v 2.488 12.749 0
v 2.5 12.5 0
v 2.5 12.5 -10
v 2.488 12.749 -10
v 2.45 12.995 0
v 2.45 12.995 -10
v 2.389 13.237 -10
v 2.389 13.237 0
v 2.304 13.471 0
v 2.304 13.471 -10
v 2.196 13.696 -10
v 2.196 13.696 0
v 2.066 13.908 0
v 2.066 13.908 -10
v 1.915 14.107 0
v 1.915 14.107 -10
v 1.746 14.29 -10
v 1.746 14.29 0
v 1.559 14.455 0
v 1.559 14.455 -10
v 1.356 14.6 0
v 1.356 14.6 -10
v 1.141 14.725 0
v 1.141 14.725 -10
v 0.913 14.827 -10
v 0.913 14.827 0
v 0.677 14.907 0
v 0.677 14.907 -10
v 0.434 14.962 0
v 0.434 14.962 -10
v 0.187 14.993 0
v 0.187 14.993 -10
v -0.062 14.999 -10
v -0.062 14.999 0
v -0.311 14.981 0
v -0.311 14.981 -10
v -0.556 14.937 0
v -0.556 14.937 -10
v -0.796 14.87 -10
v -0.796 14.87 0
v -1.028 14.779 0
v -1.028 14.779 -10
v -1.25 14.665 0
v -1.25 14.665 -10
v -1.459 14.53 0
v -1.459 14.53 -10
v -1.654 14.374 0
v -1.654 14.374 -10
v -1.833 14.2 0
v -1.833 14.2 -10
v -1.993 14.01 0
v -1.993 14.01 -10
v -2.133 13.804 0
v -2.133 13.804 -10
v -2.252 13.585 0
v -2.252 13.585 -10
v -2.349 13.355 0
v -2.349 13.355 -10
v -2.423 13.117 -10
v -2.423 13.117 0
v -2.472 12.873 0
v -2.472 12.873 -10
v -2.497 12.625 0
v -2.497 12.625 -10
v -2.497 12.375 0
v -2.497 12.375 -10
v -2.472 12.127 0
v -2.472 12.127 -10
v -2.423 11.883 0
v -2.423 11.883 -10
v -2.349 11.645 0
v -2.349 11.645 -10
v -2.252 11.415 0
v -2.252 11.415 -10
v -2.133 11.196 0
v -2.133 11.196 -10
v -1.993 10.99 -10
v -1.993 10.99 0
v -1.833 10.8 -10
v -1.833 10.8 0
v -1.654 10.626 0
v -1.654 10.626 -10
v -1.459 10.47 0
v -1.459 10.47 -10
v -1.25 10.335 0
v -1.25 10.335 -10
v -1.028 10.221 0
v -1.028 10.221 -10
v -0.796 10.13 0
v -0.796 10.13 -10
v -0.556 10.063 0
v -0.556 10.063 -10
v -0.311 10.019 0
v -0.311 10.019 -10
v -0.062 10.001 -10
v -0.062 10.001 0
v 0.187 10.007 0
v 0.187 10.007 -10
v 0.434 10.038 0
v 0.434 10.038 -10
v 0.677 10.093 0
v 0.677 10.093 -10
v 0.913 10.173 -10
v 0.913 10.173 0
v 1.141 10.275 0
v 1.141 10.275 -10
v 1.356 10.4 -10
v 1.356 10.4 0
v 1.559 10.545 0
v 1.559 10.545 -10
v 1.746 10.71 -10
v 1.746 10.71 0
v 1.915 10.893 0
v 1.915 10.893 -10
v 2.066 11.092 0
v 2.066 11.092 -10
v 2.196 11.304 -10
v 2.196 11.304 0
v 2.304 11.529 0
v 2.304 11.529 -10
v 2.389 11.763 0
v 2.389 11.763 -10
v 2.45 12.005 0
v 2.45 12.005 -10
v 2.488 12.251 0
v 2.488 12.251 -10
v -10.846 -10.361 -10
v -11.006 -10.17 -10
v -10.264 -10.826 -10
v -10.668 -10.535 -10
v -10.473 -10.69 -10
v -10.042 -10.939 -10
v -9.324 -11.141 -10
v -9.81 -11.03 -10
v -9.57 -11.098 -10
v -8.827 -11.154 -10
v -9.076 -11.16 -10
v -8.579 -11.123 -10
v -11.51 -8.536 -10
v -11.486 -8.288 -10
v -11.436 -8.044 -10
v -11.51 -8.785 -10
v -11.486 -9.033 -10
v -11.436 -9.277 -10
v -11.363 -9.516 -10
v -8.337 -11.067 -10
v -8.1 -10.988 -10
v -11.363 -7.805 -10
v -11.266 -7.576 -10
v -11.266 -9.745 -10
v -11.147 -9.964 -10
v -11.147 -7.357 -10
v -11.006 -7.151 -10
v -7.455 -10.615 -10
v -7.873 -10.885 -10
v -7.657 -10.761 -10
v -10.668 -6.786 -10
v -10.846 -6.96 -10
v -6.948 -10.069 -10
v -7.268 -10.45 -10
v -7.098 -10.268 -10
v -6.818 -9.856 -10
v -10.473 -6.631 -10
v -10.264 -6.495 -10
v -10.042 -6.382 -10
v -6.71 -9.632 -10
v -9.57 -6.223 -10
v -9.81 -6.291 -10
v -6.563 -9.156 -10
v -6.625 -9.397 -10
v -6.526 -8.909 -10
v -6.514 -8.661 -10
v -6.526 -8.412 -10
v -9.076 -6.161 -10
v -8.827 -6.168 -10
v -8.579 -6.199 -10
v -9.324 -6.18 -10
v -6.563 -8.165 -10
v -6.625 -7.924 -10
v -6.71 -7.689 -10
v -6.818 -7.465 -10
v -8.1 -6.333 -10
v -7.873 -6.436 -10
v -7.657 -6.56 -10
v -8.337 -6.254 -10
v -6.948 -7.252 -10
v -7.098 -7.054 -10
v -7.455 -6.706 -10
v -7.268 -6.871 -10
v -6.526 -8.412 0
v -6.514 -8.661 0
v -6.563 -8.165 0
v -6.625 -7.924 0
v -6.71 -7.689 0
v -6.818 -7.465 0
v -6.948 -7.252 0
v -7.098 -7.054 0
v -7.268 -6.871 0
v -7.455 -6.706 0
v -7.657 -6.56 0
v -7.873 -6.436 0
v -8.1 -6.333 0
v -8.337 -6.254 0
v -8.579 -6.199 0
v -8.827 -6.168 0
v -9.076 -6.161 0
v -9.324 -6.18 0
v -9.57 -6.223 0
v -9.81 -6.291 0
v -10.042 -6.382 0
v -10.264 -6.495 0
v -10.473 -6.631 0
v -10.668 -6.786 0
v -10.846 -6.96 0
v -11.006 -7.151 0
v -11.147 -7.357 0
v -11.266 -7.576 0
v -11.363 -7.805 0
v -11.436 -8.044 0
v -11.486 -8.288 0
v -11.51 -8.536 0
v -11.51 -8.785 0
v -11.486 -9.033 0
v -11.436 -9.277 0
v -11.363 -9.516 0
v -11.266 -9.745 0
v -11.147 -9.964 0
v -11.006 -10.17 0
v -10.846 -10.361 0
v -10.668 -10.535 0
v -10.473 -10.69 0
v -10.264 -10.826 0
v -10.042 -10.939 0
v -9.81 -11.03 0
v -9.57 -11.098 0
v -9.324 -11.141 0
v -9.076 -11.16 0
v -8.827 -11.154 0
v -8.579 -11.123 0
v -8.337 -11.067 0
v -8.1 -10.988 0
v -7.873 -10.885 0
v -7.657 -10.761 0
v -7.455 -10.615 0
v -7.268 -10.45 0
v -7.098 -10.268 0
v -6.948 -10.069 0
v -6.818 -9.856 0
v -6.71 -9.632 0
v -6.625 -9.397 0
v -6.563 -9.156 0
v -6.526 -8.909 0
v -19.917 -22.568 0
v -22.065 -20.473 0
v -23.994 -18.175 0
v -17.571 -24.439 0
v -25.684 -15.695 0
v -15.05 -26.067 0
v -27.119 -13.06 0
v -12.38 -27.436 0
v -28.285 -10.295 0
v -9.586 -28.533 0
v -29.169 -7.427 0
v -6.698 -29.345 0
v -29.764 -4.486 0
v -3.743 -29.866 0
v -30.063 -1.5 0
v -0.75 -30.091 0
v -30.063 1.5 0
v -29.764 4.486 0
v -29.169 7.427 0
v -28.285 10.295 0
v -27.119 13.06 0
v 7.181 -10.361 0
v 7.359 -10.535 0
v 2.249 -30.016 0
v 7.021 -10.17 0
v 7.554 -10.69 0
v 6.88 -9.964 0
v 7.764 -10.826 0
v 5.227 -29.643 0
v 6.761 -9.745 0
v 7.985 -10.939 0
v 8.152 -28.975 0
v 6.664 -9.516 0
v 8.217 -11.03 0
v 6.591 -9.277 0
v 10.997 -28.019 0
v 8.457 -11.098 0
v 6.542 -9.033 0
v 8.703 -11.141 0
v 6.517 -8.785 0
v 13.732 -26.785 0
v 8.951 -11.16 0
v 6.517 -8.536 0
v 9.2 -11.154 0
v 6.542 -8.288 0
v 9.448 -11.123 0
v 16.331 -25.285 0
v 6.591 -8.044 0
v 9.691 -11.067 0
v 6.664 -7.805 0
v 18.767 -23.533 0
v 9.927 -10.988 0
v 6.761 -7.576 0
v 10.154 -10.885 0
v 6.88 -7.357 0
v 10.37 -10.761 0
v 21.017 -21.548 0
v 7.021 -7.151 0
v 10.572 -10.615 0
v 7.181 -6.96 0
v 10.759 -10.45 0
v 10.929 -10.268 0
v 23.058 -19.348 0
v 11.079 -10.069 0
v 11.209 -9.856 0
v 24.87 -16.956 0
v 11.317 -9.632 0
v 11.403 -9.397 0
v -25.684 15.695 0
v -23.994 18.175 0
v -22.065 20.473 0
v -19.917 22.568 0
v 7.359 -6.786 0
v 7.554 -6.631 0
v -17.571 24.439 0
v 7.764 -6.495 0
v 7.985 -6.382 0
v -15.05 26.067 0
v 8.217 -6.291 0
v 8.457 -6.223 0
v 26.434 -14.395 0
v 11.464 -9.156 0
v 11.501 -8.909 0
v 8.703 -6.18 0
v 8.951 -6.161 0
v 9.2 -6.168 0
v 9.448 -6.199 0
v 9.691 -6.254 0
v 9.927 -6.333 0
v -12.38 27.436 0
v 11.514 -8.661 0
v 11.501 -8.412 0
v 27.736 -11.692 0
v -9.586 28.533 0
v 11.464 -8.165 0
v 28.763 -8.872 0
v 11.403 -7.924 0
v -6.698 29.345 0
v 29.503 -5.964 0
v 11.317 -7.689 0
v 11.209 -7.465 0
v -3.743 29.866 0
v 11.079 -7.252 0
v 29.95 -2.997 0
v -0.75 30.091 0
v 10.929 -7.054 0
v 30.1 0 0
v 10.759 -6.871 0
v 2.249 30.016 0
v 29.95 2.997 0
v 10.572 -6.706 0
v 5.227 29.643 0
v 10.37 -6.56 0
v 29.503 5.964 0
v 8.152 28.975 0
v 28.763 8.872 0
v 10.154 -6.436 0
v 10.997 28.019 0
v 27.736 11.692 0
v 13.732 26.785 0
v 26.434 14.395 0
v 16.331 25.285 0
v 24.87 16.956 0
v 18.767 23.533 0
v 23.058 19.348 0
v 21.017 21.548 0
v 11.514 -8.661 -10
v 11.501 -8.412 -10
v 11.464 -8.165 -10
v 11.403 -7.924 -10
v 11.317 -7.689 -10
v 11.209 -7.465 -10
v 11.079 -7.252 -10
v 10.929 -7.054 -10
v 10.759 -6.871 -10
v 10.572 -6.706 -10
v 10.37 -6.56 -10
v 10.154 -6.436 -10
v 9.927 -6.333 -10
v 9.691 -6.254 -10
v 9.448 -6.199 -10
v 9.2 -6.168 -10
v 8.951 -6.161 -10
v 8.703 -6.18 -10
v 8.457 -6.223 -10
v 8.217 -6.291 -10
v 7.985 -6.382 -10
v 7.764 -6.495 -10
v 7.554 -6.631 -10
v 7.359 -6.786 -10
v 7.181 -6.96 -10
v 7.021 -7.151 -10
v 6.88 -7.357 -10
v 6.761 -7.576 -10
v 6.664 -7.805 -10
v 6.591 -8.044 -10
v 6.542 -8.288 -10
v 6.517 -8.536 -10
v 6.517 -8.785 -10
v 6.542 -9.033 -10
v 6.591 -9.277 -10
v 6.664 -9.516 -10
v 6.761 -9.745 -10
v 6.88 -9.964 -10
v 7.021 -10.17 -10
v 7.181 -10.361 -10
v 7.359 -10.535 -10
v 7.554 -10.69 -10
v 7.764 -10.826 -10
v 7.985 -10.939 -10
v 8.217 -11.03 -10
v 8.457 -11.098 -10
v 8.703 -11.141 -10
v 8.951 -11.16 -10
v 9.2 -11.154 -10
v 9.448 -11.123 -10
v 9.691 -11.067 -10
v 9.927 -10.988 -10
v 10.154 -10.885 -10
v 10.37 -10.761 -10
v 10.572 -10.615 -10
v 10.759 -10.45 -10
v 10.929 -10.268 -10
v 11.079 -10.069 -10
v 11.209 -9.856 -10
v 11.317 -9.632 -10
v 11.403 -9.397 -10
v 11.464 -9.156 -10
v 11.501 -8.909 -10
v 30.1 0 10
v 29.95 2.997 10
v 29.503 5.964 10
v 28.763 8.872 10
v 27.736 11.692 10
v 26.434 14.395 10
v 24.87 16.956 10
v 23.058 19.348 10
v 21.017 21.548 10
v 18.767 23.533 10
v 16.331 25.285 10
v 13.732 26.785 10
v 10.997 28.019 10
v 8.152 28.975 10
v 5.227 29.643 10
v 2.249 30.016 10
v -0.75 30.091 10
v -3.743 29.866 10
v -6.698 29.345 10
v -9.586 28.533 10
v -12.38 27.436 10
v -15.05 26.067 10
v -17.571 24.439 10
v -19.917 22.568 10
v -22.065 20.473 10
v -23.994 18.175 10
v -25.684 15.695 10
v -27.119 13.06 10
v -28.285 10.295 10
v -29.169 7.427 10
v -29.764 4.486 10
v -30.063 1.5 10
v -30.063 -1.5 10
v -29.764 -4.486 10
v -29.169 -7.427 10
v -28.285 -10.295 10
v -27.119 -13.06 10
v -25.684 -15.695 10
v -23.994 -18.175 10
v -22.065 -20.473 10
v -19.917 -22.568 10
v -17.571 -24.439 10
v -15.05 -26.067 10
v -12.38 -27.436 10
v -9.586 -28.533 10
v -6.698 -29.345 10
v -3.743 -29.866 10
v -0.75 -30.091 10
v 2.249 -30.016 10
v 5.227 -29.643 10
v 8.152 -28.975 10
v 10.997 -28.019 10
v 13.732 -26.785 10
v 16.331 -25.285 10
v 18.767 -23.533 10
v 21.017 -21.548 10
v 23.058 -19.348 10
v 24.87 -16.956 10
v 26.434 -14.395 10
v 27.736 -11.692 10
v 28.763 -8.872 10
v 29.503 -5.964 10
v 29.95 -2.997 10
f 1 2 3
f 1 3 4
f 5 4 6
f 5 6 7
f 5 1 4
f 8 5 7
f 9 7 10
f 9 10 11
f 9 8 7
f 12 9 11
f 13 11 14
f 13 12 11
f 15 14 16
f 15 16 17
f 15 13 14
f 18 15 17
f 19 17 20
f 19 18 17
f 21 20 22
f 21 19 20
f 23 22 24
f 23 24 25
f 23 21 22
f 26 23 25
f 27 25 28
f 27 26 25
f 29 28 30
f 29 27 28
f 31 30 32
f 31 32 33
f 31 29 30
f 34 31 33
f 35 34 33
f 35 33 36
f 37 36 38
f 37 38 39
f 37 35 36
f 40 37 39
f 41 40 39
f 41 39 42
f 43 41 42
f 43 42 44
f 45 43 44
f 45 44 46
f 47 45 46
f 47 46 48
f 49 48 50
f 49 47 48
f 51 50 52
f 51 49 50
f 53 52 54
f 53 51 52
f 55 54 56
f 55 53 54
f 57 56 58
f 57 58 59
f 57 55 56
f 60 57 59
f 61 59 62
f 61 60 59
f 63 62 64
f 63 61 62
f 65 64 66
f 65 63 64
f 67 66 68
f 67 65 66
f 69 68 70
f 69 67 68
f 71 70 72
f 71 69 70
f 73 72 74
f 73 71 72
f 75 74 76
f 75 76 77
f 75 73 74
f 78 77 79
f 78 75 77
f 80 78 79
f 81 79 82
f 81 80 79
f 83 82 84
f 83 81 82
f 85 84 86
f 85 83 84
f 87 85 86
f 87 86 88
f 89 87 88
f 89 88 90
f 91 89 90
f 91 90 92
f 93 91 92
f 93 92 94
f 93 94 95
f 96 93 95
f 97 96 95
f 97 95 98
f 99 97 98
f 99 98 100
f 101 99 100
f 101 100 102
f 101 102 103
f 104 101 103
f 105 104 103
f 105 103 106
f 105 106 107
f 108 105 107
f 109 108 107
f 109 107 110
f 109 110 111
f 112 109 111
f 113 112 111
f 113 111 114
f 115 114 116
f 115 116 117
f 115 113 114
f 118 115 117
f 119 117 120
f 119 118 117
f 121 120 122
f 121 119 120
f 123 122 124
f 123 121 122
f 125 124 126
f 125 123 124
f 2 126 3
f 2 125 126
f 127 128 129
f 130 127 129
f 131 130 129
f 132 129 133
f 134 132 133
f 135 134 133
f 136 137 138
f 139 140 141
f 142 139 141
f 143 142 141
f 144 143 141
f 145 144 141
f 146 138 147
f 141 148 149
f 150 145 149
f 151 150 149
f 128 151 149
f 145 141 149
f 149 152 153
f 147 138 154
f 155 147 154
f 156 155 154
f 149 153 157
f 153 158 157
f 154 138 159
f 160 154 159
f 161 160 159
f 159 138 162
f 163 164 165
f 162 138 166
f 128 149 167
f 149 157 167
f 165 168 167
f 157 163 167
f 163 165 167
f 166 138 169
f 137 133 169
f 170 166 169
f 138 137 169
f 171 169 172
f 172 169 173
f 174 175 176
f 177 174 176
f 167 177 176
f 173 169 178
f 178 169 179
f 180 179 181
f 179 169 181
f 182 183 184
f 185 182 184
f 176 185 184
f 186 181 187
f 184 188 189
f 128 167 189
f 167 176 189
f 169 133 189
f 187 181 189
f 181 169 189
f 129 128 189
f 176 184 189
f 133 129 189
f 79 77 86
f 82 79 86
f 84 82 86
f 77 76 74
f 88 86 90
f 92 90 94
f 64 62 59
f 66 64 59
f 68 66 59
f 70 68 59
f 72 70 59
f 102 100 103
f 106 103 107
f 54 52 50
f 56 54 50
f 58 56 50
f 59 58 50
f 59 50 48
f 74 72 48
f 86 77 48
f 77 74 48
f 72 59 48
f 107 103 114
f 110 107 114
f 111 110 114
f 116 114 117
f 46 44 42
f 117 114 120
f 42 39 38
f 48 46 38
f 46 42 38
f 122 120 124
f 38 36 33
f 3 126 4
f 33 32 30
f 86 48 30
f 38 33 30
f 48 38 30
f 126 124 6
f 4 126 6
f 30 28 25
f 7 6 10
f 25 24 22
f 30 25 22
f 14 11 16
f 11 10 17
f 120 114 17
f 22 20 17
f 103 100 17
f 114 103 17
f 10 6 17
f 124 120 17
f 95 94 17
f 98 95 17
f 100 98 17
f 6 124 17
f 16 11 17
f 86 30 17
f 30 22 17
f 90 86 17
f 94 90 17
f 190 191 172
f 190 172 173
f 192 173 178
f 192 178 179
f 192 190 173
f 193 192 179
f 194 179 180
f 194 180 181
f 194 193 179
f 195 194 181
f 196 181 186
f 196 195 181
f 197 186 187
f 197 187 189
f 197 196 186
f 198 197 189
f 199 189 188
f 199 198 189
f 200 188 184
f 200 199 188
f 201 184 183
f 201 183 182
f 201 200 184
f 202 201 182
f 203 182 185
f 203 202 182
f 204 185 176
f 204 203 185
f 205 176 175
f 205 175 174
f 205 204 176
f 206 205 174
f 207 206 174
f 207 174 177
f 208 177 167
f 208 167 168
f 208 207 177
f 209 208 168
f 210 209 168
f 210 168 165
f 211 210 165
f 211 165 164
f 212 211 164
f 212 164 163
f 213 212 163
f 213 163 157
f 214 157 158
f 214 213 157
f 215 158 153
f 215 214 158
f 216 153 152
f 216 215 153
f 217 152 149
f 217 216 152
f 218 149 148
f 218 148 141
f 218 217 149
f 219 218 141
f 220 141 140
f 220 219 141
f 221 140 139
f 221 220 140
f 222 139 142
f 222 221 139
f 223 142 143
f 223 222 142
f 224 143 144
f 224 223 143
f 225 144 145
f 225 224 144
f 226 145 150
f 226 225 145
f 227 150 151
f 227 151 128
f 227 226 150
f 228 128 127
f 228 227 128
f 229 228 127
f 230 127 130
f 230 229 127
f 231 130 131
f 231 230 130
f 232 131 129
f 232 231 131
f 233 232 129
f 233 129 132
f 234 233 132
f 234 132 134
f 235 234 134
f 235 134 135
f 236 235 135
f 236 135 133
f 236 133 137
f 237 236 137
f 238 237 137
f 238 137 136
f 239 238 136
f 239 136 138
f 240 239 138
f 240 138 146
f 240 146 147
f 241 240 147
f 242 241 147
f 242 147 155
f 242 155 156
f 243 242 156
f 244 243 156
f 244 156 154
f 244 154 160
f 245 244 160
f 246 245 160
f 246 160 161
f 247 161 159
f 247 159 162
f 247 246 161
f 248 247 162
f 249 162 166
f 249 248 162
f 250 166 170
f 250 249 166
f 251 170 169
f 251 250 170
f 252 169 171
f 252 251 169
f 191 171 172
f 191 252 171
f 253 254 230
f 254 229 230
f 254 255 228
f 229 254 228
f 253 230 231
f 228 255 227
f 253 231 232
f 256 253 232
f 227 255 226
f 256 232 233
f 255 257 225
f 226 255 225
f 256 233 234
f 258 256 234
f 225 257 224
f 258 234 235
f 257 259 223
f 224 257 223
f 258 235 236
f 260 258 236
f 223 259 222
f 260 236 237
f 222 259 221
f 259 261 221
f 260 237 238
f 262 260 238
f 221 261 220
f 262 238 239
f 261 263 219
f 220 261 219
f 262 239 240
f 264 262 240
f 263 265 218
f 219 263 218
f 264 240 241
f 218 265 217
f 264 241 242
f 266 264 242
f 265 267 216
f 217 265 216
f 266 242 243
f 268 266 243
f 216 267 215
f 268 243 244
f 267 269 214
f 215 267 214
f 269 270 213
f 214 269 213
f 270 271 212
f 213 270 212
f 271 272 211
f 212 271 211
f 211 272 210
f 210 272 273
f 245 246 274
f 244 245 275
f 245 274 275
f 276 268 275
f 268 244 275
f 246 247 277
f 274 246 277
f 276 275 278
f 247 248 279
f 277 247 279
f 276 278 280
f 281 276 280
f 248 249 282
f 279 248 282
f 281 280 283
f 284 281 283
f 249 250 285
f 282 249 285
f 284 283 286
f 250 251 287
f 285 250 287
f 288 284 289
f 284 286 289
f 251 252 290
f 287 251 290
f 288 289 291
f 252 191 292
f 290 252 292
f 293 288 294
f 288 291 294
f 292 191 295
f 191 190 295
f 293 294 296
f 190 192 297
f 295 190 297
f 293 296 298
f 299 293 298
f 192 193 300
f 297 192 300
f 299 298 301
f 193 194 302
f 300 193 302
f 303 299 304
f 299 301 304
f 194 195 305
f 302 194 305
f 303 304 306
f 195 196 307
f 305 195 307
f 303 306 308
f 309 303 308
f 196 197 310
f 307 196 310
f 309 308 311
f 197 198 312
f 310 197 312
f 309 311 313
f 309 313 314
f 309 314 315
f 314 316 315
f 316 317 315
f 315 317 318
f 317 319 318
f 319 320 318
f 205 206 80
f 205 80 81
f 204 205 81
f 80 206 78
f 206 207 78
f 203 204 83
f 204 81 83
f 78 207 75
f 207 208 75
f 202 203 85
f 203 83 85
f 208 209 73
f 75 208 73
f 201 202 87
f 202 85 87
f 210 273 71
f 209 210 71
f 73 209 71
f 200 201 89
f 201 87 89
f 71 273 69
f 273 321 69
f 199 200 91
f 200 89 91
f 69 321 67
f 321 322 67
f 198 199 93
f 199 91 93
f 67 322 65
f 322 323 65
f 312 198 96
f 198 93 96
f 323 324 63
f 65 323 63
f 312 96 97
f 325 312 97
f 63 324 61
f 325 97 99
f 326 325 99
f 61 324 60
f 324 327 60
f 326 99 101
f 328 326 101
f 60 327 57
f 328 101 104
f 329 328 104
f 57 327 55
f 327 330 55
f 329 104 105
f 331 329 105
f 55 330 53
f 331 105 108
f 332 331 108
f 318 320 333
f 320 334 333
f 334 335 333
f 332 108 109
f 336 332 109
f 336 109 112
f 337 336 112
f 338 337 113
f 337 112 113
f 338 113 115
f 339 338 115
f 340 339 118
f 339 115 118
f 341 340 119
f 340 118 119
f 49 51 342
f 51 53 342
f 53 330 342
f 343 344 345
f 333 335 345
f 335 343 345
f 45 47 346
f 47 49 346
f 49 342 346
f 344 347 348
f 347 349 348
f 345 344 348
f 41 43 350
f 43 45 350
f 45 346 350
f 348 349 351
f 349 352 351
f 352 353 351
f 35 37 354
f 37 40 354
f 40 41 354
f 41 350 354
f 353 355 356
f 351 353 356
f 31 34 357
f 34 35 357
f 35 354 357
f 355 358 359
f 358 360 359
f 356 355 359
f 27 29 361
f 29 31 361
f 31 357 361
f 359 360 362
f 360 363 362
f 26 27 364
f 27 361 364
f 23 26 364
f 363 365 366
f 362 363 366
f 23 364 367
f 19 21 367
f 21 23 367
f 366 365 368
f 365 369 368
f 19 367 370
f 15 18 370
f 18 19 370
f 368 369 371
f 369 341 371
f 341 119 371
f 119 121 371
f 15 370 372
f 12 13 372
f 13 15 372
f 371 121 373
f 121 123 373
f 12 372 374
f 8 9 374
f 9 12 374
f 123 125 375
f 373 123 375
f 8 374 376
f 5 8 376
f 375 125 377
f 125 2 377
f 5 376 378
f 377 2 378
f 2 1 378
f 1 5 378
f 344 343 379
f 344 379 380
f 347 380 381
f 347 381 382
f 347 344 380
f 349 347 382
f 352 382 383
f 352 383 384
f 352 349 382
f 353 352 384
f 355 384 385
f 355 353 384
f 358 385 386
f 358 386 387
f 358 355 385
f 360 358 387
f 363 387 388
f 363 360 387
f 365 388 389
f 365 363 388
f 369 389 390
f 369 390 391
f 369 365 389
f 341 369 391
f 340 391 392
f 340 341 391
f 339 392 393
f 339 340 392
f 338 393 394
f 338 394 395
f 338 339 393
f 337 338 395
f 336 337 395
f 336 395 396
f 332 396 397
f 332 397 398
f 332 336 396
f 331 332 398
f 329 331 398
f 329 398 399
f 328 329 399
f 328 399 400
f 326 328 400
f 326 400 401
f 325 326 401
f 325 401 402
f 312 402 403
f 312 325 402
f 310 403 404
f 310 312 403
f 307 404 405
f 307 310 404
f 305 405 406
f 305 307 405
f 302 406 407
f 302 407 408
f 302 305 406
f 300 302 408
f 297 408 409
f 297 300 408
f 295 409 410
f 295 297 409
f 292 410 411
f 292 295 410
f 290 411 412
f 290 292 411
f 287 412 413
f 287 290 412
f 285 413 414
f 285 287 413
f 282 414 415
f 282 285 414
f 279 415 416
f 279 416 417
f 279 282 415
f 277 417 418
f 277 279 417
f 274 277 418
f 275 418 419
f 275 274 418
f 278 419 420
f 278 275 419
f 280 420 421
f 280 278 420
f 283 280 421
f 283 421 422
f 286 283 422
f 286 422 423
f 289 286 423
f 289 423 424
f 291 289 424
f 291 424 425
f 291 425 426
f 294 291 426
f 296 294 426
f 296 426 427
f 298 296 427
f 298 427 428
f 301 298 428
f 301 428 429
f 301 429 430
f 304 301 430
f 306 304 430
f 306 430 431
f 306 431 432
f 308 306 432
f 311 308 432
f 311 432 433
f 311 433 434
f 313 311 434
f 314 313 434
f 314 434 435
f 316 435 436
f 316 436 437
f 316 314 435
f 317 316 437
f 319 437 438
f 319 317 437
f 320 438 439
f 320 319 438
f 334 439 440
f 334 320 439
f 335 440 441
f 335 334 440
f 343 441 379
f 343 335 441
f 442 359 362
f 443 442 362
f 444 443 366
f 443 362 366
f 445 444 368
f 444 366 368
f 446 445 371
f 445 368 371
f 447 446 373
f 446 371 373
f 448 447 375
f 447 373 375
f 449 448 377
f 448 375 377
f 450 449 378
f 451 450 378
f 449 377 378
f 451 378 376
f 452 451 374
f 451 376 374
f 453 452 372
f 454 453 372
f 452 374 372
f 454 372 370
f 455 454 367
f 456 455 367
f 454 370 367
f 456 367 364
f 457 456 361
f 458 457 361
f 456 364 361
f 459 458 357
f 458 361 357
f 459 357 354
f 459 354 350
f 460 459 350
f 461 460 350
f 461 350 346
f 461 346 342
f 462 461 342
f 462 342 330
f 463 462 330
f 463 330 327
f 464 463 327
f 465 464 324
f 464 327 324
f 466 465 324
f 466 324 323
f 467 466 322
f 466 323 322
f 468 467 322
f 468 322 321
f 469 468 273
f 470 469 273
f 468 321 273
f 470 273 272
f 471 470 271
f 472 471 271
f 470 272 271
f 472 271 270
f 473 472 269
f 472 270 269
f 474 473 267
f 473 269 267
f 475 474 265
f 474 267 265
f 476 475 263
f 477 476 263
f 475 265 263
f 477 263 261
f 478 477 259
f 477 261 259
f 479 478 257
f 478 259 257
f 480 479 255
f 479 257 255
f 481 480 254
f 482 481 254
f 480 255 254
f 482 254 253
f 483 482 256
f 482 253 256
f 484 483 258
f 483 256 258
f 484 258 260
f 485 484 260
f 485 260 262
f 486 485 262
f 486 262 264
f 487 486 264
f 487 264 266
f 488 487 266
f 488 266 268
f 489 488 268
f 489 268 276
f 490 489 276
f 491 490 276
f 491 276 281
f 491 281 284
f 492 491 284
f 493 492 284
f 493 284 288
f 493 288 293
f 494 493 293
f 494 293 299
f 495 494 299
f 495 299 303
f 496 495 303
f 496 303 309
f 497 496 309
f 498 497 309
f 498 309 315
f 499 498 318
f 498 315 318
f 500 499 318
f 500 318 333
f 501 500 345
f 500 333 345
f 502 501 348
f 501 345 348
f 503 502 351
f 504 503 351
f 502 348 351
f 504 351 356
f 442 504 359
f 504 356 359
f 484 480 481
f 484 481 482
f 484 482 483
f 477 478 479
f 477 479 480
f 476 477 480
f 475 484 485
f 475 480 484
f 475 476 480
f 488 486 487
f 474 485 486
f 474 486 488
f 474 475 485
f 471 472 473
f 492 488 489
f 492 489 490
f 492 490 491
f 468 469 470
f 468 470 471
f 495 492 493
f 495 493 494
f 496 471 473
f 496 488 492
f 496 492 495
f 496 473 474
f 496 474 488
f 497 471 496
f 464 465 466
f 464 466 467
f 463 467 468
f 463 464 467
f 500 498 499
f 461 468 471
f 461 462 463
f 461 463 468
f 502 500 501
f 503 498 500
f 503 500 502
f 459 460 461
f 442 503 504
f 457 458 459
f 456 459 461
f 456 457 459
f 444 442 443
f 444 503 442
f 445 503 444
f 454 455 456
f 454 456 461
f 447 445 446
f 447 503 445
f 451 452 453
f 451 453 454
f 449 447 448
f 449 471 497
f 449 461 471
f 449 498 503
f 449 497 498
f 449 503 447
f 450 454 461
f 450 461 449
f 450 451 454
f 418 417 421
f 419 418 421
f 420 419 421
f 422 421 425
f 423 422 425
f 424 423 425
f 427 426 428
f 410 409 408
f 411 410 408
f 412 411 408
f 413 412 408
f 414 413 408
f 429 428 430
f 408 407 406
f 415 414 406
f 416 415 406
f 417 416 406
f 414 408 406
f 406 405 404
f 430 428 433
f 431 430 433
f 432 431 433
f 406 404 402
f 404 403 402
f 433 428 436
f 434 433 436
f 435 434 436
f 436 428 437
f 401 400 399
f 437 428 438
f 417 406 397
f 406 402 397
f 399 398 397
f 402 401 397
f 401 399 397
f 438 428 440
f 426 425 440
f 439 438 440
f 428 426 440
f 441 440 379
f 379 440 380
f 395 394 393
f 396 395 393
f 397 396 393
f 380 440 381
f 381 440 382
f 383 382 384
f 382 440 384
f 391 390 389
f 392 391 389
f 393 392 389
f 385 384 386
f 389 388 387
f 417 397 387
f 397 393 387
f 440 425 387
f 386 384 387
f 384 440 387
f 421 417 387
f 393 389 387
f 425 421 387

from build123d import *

# Parameters (mm, degrees)
SKETCH1_R           = 30.1
BOSS_EXTRUDE1_DEPTH = 10
SKETCH1_3_R         = 2.5
BOSS_EXTRUDE2_DEPTH = 10


with BuildPart() as part:
    # Sketch1 → Boss-Extrude1 (new body)
    with BuildSketch(Plane.XY):
        Circle(SKETCH1_R)
    extrude(amount=BOSS_EXTRUDE1_DEPTH)

    # Sketch1<3> → Boss-Extrude2 (add)
    with BuildSketch(Plane.XY):
        with Locations((0, 12.5)):
            Circle(SKETCH1_3_R)
        with Locations((-9.013601894, -8.660541605)):
            Circle(SKETCH1_3_R)
        with Locations((9.013601894, -8.660541605)):
            Circle(SKETCH1_3_R)
    extrude(amount=-BOSS_EXTRUDE2_DEPTH)


solid = part.part
